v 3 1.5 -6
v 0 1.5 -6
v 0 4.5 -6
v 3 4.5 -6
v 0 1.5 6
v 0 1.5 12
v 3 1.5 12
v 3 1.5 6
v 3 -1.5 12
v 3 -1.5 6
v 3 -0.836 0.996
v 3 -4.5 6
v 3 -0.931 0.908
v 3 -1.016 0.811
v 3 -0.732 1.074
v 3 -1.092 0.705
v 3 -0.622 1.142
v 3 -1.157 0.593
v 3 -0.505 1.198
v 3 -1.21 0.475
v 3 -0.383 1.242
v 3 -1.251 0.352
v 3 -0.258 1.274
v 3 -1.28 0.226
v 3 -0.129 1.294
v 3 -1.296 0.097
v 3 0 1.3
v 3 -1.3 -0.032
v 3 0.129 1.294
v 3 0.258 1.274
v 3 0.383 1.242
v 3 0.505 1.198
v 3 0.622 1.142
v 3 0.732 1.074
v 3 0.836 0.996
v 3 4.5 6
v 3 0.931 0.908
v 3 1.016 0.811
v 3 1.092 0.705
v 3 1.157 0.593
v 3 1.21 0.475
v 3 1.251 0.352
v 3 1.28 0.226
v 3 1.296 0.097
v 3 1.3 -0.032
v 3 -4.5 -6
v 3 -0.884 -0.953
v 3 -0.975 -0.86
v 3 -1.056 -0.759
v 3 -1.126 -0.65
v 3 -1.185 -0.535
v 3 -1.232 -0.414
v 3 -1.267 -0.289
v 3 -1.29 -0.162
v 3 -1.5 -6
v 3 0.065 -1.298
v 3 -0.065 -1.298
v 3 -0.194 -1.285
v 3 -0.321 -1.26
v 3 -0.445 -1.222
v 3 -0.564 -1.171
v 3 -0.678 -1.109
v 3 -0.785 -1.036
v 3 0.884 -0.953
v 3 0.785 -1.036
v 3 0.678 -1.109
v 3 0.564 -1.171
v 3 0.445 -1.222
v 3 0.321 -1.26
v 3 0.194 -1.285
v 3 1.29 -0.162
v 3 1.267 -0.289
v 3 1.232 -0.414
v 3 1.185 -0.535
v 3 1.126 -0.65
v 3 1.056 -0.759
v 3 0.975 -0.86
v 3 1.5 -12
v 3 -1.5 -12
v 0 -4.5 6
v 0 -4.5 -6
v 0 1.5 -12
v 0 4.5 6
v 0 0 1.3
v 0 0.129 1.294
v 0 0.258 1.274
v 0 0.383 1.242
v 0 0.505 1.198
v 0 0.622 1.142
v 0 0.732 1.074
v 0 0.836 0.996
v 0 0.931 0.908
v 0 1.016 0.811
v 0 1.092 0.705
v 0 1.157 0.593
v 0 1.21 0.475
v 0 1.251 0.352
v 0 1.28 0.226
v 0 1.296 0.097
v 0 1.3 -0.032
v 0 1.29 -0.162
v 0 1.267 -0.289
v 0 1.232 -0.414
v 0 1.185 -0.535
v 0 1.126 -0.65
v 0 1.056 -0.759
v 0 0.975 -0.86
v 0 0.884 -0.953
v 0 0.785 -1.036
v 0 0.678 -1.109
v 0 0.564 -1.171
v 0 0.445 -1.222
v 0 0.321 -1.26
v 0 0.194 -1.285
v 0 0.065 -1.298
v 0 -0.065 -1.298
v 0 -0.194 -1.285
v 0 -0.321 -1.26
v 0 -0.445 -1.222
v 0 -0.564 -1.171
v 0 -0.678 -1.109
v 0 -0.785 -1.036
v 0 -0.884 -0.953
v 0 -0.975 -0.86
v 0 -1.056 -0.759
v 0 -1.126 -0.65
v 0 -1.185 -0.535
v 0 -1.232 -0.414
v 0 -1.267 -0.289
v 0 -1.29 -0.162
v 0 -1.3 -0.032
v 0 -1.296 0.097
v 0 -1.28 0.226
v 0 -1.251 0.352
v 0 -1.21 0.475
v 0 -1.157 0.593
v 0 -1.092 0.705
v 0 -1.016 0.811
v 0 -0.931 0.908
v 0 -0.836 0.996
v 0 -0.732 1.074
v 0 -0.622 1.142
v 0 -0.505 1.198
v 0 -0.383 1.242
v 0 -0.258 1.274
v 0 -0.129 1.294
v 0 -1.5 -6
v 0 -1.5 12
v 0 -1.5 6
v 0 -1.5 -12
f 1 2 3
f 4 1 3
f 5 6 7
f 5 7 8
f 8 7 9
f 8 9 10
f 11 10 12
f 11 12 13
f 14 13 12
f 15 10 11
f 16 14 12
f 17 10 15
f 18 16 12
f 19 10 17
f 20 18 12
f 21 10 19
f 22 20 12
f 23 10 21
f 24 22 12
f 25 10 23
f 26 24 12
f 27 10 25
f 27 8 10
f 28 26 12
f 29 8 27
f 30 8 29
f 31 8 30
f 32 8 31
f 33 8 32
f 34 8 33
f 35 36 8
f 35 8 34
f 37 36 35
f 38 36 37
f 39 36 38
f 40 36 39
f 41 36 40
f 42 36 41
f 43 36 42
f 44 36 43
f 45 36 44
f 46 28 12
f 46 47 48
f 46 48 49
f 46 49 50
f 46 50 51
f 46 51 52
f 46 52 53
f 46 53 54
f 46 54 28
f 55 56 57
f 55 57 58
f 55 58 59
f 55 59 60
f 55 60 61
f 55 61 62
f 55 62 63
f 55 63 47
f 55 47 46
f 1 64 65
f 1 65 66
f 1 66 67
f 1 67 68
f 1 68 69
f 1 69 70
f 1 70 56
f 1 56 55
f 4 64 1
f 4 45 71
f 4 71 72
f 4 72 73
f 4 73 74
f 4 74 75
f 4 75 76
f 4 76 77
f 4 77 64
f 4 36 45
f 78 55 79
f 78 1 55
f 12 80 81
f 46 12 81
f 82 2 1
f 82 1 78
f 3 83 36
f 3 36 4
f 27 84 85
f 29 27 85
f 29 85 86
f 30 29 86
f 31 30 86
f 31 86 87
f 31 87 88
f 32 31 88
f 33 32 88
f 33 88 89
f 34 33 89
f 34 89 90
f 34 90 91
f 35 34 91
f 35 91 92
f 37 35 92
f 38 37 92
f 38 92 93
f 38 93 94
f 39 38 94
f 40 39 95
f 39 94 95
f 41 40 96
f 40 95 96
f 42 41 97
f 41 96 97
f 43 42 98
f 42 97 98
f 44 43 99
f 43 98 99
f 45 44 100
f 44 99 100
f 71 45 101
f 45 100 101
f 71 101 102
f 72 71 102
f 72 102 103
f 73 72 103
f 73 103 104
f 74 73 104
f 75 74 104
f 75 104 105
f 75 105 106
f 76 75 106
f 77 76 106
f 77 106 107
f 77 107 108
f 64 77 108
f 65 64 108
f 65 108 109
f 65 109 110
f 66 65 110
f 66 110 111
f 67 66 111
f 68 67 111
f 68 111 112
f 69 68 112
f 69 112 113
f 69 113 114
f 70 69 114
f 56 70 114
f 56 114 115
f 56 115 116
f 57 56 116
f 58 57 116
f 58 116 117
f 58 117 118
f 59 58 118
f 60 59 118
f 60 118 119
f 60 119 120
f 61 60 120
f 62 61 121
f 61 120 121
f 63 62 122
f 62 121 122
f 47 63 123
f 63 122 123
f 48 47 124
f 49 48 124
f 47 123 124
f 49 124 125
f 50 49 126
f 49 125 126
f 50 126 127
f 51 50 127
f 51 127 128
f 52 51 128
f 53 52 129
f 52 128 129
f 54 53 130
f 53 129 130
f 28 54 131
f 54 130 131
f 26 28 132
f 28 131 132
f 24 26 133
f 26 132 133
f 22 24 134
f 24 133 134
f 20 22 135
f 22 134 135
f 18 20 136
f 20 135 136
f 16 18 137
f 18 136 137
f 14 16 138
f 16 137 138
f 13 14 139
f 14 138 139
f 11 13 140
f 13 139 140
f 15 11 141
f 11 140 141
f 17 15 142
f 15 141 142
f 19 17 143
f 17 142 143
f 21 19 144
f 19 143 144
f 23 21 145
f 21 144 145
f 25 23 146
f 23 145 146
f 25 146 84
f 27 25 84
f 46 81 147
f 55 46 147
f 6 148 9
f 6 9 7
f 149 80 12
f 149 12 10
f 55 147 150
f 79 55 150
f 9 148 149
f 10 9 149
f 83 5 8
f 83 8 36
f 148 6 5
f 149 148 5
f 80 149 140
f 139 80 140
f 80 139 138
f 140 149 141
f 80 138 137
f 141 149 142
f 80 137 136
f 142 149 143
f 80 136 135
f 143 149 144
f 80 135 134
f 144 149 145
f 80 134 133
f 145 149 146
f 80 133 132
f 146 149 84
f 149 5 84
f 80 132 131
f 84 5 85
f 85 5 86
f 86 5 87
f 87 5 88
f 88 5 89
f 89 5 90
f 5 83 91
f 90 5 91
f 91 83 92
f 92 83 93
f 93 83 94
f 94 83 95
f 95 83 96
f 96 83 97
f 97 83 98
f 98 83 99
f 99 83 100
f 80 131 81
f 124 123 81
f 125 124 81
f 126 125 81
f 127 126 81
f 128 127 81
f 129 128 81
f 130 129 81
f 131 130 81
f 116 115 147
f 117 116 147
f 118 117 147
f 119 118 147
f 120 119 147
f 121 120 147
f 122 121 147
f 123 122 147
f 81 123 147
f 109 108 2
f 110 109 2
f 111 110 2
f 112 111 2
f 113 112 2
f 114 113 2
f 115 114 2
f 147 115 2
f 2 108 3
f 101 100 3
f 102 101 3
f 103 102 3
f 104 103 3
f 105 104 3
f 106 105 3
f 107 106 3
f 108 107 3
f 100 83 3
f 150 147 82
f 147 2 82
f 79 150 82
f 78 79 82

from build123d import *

# Parameters (mm, degrees)
PRINCIPAL_W                  = 12
PRINCIPAL_H                  = 3
PRINCIPAL_W_2                = 24
BASE_DEPTH                   = 3
FURO_DE_DI_METRO_2_6_2_6_1_D = 2.6


with BuildPart() as part:
    # Principal → Base (new body)
    with BuildSketch(Plane(origin=(0, 0, 0), x_dir=(0, 0, -1), z_dir=(1, 0, 0))):
        with Locations((0, 3)):
            Rectangle(PRINCIPAL_W, PRINCIPAL_H)
        Rectangle(PRINCIPAL_W_2, PRINCIPAL_H)
        with Locations((0, -3)):
            Rectangle(PRINCIPAL_W, PRINCIPAL_H)
    extrude(amount=BASE_DEPTH)

    # Furo de diâmetro Ø2.6 (2.6)1 (through all)
    with Locations(Plane(origin=(3, 0, 0), x_dir=(0, 0, -1), z_dir=(1, 0, 0))):
        with Locations((0, 0)):
            Hole(FURO_DE_DI_METRO_2_6_2_6_1_D / 2)


solid = part.part
